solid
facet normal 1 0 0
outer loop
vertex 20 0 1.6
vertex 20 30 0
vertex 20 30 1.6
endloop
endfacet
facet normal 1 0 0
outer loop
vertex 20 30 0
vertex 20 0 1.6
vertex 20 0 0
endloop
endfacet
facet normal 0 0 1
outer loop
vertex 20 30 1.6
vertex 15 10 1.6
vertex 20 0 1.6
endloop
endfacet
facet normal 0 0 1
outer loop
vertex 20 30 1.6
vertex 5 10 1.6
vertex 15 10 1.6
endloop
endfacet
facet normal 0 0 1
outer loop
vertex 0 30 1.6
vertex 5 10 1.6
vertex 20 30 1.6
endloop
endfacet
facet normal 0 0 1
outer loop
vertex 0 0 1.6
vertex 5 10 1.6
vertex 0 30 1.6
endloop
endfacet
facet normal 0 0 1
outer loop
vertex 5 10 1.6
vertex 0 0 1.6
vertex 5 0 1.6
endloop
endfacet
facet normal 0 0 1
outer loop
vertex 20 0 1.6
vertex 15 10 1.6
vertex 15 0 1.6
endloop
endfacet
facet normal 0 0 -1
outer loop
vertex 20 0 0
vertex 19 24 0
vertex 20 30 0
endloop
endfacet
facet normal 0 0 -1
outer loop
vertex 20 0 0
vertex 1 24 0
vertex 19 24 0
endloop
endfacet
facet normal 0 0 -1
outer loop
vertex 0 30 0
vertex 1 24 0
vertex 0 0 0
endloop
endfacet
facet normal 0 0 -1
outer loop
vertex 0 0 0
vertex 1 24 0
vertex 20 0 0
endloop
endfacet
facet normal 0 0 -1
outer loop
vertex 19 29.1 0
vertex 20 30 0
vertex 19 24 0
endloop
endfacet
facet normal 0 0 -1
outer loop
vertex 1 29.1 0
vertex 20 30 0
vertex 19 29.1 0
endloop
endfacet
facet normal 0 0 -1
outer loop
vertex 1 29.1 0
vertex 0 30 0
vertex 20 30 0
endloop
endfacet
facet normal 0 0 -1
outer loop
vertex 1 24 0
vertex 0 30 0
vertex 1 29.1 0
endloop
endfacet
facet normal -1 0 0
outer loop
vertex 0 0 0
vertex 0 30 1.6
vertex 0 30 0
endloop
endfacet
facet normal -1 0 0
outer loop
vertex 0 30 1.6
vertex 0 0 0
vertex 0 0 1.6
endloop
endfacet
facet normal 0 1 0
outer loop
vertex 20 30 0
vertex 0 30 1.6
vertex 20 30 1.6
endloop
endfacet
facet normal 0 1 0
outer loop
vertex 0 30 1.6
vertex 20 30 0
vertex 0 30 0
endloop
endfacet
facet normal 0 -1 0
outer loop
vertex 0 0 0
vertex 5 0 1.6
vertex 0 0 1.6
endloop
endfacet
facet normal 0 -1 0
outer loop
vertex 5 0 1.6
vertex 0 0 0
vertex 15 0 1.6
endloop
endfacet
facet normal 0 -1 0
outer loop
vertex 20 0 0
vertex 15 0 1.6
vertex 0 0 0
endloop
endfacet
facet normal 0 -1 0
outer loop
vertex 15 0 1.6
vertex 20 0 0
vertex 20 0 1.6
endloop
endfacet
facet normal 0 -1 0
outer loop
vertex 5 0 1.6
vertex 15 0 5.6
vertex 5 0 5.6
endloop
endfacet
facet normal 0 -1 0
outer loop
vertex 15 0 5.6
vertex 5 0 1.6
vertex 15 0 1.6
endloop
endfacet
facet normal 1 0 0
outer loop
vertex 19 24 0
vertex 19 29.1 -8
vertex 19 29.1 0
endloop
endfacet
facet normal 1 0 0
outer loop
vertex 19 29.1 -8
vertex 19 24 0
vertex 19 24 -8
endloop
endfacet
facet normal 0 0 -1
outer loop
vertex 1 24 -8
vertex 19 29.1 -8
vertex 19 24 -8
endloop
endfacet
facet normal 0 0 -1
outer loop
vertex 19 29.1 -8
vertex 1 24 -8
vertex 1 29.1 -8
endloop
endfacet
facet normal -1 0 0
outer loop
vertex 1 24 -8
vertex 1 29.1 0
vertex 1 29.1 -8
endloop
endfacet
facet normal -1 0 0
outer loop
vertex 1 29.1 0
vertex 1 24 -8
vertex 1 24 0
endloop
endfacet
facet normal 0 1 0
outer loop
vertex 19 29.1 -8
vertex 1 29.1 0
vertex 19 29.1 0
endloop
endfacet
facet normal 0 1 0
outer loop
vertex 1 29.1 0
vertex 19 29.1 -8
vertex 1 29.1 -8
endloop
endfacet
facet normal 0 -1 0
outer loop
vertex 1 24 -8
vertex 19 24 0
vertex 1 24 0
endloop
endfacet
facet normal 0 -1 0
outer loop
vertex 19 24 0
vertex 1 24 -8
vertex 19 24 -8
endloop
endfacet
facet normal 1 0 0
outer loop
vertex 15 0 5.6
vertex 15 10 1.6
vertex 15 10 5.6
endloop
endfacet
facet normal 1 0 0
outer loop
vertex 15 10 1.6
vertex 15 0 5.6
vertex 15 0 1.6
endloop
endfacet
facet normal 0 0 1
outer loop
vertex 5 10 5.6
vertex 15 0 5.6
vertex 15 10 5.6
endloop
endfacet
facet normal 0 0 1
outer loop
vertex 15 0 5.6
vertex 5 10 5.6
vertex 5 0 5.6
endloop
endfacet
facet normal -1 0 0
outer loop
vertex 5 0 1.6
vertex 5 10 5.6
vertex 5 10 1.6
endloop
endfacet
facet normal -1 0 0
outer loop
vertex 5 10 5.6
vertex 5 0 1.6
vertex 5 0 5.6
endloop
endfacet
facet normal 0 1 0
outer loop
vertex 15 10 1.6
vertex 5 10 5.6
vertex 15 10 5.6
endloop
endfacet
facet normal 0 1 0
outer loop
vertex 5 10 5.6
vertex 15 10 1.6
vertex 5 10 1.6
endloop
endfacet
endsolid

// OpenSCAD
/*
 * FTDI Basic
 *
 * Copyright 2012 b@Zi.iS
 *
 * License CC BY 3.0
 */

ftdi_basic();

module ftdi_basic() {

	// PCB
	color([.75,0,0]) {
		cube([
			20,
			30,
			1.6
		]);
	}

	// Header
	color([0,0,0]) {
		translate([
			1,
			24,
			-8
		]) {
			cube([
				18,
				5.1,
				8
			]);
		}
	}

	// USB
	color([.75,.75,.75]) {
		translate([
			5,
			0,
			1.6
		]) {
			cube([
				10,
				10,
				4
			]);
		}
	}

}
